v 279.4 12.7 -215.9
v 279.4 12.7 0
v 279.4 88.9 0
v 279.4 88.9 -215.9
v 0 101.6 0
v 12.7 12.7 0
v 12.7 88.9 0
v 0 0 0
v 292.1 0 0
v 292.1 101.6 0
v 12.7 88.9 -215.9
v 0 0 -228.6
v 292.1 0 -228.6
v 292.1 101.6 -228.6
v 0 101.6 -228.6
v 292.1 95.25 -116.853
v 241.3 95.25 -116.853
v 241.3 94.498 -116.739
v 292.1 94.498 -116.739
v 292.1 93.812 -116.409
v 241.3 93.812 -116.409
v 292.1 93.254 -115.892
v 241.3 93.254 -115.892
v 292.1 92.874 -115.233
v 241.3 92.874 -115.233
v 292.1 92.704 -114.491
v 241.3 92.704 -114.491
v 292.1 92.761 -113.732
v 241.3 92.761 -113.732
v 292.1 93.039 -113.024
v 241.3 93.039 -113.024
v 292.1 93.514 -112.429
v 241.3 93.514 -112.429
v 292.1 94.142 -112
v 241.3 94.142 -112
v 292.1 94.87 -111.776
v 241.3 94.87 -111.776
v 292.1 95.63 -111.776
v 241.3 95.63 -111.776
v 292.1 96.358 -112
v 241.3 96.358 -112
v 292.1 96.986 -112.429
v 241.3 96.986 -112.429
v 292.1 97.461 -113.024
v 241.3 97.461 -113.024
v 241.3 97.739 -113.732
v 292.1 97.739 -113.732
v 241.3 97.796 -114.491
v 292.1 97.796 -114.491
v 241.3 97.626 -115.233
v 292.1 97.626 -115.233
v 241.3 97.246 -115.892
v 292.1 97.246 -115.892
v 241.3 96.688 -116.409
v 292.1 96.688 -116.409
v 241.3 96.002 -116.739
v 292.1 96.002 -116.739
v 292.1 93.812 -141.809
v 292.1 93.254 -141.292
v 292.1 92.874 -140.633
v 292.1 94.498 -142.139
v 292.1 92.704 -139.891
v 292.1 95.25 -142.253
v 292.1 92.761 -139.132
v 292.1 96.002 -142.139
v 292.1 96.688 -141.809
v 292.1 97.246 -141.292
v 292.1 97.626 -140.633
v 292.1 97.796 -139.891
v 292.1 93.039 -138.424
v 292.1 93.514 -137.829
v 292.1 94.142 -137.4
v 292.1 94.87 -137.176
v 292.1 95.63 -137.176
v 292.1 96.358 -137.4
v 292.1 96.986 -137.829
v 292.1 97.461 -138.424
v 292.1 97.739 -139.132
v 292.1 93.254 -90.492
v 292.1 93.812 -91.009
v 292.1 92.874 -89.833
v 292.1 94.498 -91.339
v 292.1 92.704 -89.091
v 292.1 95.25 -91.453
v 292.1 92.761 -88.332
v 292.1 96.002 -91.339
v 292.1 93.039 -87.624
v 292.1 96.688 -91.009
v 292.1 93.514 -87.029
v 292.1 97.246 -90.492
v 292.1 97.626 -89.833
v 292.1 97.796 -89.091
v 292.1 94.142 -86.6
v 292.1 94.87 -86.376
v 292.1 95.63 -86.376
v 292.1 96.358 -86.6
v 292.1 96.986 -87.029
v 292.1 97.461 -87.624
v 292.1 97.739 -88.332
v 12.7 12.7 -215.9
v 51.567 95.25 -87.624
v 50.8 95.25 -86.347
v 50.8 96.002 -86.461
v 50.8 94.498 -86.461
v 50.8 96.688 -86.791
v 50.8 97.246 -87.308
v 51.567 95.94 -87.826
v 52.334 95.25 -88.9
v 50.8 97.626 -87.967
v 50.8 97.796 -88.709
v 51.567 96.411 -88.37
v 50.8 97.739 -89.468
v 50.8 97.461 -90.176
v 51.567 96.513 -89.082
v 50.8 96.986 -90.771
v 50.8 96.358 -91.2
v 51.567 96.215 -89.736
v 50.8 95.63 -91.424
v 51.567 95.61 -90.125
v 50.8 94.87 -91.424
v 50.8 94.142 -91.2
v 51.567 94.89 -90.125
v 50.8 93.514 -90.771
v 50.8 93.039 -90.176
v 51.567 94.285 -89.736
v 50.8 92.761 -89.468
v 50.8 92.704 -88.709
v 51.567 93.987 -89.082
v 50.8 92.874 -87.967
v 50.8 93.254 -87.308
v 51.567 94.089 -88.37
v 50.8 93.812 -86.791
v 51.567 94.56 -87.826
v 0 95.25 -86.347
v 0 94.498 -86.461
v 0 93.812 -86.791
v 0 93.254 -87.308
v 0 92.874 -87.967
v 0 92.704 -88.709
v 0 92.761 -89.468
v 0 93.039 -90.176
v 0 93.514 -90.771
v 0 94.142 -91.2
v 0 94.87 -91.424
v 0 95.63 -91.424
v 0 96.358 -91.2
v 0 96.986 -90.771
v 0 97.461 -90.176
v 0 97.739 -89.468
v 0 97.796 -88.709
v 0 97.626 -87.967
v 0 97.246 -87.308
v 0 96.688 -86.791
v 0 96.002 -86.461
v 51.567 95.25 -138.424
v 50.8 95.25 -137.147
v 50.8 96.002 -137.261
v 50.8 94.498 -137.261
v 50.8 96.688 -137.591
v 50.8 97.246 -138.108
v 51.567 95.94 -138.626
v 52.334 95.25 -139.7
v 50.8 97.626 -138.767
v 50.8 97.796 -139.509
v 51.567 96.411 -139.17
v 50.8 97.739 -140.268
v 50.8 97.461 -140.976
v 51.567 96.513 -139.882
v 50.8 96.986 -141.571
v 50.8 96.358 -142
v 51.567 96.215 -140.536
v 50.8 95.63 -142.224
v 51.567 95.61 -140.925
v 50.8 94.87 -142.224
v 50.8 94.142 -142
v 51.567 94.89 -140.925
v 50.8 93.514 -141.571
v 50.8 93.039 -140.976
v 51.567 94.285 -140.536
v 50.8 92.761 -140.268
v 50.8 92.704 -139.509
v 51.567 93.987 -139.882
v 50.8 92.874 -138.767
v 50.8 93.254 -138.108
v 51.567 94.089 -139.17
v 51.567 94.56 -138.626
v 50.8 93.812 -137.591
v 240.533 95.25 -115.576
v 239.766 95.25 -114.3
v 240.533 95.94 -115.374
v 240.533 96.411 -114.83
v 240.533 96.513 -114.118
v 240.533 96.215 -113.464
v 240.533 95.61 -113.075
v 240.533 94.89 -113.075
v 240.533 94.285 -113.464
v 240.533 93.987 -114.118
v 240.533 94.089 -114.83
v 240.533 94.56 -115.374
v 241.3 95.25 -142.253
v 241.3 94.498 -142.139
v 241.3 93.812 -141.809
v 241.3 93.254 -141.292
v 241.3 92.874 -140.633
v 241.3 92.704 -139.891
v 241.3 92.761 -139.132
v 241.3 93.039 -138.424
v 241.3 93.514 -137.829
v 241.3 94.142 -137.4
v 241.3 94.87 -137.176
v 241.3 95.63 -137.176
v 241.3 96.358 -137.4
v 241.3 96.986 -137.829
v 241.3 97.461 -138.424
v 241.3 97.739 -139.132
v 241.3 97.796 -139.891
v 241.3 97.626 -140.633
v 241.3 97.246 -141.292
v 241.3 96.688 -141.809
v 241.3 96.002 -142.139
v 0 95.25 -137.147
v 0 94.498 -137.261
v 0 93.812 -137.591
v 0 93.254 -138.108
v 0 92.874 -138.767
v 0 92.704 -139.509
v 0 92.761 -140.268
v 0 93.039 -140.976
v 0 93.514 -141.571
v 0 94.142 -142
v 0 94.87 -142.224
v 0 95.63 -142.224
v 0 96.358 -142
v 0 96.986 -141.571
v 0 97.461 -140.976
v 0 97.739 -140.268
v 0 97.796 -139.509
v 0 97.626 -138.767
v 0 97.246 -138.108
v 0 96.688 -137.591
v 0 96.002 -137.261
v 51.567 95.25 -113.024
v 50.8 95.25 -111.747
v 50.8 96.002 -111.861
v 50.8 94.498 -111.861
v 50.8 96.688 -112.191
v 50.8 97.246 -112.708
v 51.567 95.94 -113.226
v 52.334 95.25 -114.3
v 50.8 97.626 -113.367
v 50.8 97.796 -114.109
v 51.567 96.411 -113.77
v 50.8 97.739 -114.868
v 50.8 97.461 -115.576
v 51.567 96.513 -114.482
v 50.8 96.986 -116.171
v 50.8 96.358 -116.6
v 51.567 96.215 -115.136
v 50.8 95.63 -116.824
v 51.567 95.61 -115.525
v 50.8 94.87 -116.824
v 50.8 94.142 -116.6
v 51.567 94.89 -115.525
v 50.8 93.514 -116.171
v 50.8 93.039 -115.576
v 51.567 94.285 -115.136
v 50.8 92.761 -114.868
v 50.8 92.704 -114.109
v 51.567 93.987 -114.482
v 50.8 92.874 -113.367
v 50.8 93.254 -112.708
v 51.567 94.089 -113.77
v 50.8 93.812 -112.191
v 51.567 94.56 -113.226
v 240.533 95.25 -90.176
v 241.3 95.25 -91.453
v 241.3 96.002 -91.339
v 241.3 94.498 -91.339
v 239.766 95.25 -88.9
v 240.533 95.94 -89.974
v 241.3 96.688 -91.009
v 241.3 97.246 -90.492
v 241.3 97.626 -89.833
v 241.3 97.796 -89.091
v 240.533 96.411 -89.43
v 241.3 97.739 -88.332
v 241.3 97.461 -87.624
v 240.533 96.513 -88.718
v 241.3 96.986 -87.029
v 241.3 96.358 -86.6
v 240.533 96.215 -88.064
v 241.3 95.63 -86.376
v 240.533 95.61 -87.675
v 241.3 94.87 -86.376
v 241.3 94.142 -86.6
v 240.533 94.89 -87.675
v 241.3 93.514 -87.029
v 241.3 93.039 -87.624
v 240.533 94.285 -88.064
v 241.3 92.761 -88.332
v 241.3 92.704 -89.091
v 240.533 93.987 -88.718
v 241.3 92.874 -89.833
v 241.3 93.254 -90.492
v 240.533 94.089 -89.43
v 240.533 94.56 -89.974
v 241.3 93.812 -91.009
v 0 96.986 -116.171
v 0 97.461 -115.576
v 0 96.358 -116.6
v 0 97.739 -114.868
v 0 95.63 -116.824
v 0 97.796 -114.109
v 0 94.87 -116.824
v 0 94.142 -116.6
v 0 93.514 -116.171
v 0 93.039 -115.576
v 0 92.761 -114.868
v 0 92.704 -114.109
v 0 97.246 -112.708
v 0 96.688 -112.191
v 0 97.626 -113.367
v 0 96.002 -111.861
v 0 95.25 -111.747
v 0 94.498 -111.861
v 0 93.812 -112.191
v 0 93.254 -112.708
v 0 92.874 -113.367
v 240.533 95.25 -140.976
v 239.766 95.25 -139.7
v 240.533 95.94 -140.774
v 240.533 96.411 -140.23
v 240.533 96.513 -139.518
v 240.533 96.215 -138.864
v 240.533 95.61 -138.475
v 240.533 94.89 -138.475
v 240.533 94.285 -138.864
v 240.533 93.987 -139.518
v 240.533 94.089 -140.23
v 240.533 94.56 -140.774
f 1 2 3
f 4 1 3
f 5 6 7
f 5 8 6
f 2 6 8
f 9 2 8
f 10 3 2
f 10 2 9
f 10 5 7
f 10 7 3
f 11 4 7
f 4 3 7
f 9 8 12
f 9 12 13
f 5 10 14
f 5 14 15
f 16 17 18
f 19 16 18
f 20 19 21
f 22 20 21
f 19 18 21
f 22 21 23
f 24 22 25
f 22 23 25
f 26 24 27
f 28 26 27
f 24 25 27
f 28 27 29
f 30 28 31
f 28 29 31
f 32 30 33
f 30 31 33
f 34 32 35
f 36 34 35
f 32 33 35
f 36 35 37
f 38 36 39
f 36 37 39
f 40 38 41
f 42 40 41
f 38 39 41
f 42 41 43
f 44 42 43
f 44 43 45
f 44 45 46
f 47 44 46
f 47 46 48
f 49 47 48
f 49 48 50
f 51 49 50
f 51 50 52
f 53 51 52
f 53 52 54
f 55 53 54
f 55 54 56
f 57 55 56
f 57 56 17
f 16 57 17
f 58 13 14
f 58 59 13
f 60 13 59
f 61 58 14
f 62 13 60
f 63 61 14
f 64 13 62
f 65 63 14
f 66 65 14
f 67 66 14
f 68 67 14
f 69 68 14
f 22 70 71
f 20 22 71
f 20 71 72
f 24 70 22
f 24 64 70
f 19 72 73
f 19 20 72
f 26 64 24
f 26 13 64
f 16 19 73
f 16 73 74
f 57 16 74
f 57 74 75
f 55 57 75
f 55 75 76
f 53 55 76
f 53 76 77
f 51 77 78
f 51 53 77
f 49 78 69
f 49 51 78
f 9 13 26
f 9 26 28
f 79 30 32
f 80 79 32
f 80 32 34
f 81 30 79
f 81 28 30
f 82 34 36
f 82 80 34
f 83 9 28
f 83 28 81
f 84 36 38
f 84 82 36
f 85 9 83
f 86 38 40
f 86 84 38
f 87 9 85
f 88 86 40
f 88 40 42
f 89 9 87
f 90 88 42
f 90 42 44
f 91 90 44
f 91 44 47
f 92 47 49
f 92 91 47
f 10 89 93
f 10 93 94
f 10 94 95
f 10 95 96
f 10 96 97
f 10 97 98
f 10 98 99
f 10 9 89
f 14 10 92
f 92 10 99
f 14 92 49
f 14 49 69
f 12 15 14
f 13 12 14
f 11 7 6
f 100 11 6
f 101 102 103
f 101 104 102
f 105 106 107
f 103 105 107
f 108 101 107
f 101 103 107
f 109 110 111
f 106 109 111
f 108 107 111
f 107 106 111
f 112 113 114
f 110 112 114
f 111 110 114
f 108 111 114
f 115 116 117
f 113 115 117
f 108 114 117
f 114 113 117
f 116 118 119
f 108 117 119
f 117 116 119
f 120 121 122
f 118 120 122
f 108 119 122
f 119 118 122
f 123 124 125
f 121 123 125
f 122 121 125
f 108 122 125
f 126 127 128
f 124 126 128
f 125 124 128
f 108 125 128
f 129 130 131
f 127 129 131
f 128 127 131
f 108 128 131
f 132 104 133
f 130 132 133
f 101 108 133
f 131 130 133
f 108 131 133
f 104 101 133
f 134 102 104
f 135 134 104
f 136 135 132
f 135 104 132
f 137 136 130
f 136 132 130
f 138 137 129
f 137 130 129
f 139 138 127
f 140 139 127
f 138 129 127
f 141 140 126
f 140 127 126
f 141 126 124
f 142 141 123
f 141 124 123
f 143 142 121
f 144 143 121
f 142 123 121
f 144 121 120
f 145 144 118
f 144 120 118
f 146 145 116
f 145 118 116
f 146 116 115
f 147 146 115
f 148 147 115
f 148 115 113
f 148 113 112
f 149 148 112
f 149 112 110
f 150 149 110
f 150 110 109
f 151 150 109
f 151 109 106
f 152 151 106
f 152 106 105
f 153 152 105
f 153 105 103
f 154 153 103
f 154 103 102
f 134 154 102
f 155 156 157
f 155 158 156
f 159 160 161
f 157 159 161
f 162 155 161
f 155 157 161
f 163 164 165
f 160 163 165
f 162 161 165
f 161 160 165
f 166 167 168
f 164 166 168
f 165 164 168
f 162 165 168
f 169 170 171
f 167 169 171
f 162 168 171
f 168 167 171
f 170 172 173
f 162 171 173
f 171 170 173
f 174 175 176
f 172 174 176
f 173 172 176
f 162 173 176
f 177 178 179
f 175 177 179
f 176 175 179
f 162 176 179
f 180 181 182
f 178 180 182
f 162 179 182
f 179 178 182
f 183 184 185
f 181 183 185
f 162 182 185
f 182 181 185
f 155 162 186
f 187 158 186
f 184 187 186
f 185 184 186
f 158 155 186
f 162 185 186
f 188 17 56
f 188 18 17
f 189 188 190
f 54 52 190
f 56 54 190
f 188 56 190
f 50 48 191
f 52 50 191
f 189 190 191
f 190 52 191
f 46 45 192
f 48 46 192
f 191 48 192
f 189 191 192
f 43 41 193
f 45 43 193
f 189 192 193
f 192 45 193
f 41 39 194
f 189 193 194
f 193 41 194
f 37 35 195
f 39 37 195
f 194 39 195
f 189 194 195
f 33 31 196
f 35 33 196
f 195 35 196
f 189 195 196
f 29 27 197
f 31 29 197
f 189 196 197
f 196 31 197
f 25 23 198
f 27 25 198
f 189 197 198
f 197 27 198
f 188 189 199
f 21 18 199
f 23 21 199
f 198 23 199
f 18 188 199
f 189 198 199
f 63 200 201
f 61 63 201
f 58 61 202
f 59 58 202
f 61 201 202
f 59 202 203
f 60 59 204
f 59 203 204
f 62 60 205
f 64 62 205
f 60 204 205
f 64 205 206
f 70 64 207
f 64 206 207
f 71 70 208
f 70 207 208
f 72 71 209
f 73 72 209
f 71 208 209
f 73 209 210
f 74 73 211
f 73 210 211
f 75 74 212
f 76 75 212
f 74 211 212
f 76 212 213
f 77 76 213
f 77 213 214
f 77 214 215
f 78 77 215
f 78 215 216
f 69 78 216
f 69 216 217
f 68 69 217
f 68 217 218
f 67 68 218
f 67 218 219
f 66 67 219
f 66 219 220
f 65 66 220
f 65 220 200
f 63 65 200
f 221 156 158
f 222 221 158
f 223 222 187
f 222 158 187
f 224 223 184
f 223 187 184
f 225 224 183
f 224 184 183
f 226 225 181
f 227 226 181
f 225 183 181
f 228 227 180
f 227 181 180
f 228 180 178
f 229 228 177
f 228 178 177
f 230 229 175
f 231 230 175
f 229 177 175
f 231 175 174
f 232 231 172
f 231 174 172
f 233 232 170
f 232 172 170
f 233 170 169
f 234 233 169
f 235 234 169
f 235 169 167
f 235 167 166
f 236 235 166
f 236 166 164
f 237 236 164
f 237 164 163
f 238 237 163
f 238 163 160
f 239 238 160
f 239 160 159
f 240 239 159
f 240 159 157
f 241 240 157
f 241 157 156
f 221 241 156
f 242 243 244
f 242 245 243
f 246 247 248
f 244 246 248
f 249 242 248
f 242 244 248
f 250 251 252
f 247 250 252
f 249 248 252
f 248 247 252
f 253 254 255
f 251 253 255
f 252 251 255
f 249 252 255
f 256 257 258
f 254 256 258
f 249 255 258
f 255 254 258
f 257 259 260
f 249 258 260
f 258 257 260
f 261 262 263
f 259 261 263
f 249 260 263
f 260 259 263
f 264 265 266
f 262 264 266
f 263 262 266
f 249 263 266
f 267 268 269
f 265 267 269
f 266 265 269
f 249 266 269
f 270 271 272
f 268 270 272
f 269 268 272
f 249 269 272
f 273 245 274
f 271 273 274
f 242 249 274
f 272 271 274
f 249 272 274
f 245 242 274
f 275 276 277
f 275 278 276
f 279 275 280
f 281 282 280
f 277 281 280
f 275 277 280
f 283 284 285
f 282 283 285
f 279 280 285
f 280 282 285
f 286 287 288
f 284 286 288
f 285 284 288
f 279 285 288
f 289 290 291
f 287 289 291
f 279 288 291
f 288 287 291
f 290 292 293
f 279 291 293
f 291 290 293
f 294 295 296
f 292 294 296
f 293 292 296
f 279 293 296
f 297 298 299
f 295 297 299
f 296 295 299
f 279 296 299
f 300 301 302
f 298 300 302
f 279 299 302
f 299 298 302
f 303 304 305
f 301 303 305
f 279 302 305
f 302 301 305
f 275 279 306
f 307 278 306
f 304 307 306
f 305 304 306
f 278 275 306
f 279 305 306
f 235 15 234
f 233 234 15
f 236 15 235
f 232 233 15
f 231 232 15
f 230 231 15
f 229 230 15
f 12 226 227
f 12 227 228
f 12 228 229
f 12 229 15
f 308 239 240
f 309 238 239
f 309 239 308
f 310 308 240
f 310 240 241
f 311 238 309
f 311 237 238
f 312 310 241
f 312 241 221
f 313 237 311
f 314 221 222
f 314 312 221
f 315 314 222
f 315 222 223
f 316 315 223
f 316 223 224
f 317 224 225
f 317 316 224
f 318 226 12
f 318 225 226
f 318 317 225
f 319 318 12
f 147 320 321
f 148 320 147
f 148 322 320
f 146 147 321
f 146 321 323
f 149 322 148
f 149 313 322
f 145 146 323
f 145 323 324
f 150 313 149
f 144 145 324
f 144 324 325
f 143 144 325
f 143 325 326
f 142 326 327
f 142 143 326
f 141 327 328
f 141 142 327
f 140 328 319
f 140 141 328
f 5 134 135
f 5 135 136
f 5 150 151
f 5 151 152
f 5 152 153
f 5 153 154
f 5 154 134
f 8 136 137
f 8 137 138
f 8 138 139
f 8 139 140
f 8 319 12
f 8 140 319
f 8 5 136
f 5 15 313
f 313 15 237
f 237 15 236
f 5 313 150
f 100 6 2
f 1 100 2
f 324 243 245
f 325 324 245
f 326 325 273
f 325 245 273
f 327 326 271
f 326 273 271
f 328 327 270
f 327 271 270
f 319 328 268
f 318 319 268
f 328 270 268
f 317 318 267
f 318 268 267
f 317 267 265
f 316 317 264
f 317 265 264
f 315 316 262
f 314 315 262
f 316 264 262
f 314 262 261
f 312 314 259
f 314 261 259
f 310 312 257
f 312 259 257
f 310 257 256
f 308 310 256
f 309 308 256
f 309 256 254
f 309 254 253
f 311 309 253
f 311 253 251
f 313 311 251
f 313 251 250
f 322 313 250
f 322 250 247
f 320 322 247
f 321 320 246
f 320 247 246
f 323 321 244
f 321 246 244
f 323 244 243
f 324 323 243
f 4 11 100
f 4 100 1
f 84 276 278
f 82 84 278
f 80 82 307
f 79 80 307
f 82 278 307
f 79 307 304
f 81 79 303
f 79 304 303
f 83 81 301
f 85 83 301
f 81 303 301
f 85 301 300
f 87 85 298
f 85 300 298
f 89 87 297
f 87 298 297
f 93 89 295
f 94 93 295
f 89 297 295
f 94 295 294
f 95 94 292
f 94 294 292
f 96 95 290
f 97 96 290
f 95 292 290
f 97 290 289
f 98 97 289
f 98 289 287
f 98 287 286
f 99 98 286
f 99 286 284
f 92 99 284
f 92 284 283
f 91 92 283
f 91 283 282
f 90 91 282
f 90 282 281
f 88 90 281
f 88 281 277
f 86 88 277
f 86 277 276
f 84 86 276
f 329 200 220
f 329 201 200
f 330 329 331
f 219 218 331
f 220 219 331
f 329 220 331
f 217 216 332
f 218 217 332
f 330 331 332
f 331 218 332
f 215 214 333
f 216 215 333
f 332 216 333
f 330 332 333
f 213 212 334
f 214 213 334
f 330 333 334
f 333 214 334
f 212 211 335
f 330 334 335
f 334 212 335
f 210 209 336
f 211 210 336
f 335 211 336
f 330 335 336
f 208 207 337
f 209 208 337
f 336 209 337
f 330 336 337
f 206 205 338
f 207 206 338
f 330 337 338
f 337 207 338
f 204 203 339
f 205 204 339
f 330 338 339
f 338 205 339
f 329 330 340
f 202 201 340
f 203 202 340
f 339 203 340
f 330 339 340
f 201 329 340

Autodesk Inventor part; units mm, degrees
ref_plane "YZ Plane" through (0, 0, 0) normal (1, 0, 0) x (0, 1, 0)
ref_plane "XZ Plane" through (0, 0, 0) normal (0, 1, 0) x (-1, 0, 0)
ref_plane "XY Plane" through (0, 0, 0) normal (0, 0, 1) x (1, 0, 0)
sketch "BottomBoxFrame" plane through (0, 0, 0) normal (0, 0, 1) x (1, 0, 0)
  line L0 (0, 0) -> (292.1, 0)
  line L1 (292.1, 0) -> (292.1, 101.6)
  line L2 (292.1, 101.6) -> (0, 101.6)
  line L3 (0, 101.6) -> (0, 0)
  dimension "d0" = 101.6
  dimension "d1" = 292.1
extrude "BottomBoxWidth" add sketch "BottomBoxFrame" against normal blind 228.6
sketch "TrayShape" plane through (0, 0, 0) normal (0, 0, 1) x (1, 0, 0)
  line L0 (12.7, 12.7) -> (279.4, 12.7)
  line L1 (279.4, 12.7) -> (279.4, 88.9)
  line L2 (279.4, 88.9) -> (12.7, 88.9)
  line L3 (12.7, 88.9) -> (12.7, 12.7)
  line L4 (0, 0) -> (292.1, 0) projected
  line L5 (0, 101.6) -> (0, 0) projected
  line L6 (292.1, 0) -> (292.1, 101.6) projected
  line L7 (292.1, 101.6) -> (0, 101.6) projected
  dimension "d5" = 12.7
  dimension "d6" = 12.7
  dimension "d7" = 12.7
  dimension "d10" = 12.7
extrude "TrayCut" cut sketch "TrayShape" against normal blind 215.9 contours L3 L2 L1 L0
sketch "RightHoleGeo" plane through (292.1, 0, 0) normal (1, 0, 0) x (0, 0, -1)
  line L0 (0, 101.6) -> (228.6, 101.6) projected
  line L1 (0, 0) -> (0, 101.6) projected
  point P0 (88.9, 95.25)
  point P1 (114.3, 95.25)
  point P2 (139.7, 95.25)
  dimension "d18" = 6.35
  dimension "d19" = 88.9
  dimension "d22" = 25.4
hole "RightPlateHoles" at (292.1, 95.25, -88.9) at (292.1, 95.25, -114.3) at (292.1, 95.25, -139.7) direction (-1, 0, 0) diameter 5.1054 depth 50.8 tip angle 118 clearance for "Flat Head Machine Screw (82)" size "#10" standard "Ansi Unified Screw Threads"
sketch "LeftHoleGeo" plane through (0, 0, 0) normal (-1, 0, 0) x (0, 0, 1)
  line L0 (0, 101.6) -> (-228.6, 101.6) projected
  line L1 (-228.6, 0) -> (-228.6, 101.6) projected
  point P0 (0, 0)
  point P1 (-139.7, 95.25)
  point P2 (-114.3, 95.25)
  point P3 (-88.9, 95.25)
  dimension "d34" = 6.35
  dimension "d35" = 88.9
  dimension "d38" = 25.4
hole "LeftPlateHoles" at (0, 95.25, -139.7) at (0, 95.25, -114.3) at (0, 95.25, -88.9) direction (1, 0, 0) diameter 5.1054 depth 50.8 tip angle 118 clearance for "Flat Head Machine Screw (82)" size "#10" standard "Ansi Unified Screw Threads"
equation "\"d6\" = d5"
equation "\"d7\" = d6"
equation "\"d10\" = d5"
properties part number "BatteryBoxV2-Bottom"
